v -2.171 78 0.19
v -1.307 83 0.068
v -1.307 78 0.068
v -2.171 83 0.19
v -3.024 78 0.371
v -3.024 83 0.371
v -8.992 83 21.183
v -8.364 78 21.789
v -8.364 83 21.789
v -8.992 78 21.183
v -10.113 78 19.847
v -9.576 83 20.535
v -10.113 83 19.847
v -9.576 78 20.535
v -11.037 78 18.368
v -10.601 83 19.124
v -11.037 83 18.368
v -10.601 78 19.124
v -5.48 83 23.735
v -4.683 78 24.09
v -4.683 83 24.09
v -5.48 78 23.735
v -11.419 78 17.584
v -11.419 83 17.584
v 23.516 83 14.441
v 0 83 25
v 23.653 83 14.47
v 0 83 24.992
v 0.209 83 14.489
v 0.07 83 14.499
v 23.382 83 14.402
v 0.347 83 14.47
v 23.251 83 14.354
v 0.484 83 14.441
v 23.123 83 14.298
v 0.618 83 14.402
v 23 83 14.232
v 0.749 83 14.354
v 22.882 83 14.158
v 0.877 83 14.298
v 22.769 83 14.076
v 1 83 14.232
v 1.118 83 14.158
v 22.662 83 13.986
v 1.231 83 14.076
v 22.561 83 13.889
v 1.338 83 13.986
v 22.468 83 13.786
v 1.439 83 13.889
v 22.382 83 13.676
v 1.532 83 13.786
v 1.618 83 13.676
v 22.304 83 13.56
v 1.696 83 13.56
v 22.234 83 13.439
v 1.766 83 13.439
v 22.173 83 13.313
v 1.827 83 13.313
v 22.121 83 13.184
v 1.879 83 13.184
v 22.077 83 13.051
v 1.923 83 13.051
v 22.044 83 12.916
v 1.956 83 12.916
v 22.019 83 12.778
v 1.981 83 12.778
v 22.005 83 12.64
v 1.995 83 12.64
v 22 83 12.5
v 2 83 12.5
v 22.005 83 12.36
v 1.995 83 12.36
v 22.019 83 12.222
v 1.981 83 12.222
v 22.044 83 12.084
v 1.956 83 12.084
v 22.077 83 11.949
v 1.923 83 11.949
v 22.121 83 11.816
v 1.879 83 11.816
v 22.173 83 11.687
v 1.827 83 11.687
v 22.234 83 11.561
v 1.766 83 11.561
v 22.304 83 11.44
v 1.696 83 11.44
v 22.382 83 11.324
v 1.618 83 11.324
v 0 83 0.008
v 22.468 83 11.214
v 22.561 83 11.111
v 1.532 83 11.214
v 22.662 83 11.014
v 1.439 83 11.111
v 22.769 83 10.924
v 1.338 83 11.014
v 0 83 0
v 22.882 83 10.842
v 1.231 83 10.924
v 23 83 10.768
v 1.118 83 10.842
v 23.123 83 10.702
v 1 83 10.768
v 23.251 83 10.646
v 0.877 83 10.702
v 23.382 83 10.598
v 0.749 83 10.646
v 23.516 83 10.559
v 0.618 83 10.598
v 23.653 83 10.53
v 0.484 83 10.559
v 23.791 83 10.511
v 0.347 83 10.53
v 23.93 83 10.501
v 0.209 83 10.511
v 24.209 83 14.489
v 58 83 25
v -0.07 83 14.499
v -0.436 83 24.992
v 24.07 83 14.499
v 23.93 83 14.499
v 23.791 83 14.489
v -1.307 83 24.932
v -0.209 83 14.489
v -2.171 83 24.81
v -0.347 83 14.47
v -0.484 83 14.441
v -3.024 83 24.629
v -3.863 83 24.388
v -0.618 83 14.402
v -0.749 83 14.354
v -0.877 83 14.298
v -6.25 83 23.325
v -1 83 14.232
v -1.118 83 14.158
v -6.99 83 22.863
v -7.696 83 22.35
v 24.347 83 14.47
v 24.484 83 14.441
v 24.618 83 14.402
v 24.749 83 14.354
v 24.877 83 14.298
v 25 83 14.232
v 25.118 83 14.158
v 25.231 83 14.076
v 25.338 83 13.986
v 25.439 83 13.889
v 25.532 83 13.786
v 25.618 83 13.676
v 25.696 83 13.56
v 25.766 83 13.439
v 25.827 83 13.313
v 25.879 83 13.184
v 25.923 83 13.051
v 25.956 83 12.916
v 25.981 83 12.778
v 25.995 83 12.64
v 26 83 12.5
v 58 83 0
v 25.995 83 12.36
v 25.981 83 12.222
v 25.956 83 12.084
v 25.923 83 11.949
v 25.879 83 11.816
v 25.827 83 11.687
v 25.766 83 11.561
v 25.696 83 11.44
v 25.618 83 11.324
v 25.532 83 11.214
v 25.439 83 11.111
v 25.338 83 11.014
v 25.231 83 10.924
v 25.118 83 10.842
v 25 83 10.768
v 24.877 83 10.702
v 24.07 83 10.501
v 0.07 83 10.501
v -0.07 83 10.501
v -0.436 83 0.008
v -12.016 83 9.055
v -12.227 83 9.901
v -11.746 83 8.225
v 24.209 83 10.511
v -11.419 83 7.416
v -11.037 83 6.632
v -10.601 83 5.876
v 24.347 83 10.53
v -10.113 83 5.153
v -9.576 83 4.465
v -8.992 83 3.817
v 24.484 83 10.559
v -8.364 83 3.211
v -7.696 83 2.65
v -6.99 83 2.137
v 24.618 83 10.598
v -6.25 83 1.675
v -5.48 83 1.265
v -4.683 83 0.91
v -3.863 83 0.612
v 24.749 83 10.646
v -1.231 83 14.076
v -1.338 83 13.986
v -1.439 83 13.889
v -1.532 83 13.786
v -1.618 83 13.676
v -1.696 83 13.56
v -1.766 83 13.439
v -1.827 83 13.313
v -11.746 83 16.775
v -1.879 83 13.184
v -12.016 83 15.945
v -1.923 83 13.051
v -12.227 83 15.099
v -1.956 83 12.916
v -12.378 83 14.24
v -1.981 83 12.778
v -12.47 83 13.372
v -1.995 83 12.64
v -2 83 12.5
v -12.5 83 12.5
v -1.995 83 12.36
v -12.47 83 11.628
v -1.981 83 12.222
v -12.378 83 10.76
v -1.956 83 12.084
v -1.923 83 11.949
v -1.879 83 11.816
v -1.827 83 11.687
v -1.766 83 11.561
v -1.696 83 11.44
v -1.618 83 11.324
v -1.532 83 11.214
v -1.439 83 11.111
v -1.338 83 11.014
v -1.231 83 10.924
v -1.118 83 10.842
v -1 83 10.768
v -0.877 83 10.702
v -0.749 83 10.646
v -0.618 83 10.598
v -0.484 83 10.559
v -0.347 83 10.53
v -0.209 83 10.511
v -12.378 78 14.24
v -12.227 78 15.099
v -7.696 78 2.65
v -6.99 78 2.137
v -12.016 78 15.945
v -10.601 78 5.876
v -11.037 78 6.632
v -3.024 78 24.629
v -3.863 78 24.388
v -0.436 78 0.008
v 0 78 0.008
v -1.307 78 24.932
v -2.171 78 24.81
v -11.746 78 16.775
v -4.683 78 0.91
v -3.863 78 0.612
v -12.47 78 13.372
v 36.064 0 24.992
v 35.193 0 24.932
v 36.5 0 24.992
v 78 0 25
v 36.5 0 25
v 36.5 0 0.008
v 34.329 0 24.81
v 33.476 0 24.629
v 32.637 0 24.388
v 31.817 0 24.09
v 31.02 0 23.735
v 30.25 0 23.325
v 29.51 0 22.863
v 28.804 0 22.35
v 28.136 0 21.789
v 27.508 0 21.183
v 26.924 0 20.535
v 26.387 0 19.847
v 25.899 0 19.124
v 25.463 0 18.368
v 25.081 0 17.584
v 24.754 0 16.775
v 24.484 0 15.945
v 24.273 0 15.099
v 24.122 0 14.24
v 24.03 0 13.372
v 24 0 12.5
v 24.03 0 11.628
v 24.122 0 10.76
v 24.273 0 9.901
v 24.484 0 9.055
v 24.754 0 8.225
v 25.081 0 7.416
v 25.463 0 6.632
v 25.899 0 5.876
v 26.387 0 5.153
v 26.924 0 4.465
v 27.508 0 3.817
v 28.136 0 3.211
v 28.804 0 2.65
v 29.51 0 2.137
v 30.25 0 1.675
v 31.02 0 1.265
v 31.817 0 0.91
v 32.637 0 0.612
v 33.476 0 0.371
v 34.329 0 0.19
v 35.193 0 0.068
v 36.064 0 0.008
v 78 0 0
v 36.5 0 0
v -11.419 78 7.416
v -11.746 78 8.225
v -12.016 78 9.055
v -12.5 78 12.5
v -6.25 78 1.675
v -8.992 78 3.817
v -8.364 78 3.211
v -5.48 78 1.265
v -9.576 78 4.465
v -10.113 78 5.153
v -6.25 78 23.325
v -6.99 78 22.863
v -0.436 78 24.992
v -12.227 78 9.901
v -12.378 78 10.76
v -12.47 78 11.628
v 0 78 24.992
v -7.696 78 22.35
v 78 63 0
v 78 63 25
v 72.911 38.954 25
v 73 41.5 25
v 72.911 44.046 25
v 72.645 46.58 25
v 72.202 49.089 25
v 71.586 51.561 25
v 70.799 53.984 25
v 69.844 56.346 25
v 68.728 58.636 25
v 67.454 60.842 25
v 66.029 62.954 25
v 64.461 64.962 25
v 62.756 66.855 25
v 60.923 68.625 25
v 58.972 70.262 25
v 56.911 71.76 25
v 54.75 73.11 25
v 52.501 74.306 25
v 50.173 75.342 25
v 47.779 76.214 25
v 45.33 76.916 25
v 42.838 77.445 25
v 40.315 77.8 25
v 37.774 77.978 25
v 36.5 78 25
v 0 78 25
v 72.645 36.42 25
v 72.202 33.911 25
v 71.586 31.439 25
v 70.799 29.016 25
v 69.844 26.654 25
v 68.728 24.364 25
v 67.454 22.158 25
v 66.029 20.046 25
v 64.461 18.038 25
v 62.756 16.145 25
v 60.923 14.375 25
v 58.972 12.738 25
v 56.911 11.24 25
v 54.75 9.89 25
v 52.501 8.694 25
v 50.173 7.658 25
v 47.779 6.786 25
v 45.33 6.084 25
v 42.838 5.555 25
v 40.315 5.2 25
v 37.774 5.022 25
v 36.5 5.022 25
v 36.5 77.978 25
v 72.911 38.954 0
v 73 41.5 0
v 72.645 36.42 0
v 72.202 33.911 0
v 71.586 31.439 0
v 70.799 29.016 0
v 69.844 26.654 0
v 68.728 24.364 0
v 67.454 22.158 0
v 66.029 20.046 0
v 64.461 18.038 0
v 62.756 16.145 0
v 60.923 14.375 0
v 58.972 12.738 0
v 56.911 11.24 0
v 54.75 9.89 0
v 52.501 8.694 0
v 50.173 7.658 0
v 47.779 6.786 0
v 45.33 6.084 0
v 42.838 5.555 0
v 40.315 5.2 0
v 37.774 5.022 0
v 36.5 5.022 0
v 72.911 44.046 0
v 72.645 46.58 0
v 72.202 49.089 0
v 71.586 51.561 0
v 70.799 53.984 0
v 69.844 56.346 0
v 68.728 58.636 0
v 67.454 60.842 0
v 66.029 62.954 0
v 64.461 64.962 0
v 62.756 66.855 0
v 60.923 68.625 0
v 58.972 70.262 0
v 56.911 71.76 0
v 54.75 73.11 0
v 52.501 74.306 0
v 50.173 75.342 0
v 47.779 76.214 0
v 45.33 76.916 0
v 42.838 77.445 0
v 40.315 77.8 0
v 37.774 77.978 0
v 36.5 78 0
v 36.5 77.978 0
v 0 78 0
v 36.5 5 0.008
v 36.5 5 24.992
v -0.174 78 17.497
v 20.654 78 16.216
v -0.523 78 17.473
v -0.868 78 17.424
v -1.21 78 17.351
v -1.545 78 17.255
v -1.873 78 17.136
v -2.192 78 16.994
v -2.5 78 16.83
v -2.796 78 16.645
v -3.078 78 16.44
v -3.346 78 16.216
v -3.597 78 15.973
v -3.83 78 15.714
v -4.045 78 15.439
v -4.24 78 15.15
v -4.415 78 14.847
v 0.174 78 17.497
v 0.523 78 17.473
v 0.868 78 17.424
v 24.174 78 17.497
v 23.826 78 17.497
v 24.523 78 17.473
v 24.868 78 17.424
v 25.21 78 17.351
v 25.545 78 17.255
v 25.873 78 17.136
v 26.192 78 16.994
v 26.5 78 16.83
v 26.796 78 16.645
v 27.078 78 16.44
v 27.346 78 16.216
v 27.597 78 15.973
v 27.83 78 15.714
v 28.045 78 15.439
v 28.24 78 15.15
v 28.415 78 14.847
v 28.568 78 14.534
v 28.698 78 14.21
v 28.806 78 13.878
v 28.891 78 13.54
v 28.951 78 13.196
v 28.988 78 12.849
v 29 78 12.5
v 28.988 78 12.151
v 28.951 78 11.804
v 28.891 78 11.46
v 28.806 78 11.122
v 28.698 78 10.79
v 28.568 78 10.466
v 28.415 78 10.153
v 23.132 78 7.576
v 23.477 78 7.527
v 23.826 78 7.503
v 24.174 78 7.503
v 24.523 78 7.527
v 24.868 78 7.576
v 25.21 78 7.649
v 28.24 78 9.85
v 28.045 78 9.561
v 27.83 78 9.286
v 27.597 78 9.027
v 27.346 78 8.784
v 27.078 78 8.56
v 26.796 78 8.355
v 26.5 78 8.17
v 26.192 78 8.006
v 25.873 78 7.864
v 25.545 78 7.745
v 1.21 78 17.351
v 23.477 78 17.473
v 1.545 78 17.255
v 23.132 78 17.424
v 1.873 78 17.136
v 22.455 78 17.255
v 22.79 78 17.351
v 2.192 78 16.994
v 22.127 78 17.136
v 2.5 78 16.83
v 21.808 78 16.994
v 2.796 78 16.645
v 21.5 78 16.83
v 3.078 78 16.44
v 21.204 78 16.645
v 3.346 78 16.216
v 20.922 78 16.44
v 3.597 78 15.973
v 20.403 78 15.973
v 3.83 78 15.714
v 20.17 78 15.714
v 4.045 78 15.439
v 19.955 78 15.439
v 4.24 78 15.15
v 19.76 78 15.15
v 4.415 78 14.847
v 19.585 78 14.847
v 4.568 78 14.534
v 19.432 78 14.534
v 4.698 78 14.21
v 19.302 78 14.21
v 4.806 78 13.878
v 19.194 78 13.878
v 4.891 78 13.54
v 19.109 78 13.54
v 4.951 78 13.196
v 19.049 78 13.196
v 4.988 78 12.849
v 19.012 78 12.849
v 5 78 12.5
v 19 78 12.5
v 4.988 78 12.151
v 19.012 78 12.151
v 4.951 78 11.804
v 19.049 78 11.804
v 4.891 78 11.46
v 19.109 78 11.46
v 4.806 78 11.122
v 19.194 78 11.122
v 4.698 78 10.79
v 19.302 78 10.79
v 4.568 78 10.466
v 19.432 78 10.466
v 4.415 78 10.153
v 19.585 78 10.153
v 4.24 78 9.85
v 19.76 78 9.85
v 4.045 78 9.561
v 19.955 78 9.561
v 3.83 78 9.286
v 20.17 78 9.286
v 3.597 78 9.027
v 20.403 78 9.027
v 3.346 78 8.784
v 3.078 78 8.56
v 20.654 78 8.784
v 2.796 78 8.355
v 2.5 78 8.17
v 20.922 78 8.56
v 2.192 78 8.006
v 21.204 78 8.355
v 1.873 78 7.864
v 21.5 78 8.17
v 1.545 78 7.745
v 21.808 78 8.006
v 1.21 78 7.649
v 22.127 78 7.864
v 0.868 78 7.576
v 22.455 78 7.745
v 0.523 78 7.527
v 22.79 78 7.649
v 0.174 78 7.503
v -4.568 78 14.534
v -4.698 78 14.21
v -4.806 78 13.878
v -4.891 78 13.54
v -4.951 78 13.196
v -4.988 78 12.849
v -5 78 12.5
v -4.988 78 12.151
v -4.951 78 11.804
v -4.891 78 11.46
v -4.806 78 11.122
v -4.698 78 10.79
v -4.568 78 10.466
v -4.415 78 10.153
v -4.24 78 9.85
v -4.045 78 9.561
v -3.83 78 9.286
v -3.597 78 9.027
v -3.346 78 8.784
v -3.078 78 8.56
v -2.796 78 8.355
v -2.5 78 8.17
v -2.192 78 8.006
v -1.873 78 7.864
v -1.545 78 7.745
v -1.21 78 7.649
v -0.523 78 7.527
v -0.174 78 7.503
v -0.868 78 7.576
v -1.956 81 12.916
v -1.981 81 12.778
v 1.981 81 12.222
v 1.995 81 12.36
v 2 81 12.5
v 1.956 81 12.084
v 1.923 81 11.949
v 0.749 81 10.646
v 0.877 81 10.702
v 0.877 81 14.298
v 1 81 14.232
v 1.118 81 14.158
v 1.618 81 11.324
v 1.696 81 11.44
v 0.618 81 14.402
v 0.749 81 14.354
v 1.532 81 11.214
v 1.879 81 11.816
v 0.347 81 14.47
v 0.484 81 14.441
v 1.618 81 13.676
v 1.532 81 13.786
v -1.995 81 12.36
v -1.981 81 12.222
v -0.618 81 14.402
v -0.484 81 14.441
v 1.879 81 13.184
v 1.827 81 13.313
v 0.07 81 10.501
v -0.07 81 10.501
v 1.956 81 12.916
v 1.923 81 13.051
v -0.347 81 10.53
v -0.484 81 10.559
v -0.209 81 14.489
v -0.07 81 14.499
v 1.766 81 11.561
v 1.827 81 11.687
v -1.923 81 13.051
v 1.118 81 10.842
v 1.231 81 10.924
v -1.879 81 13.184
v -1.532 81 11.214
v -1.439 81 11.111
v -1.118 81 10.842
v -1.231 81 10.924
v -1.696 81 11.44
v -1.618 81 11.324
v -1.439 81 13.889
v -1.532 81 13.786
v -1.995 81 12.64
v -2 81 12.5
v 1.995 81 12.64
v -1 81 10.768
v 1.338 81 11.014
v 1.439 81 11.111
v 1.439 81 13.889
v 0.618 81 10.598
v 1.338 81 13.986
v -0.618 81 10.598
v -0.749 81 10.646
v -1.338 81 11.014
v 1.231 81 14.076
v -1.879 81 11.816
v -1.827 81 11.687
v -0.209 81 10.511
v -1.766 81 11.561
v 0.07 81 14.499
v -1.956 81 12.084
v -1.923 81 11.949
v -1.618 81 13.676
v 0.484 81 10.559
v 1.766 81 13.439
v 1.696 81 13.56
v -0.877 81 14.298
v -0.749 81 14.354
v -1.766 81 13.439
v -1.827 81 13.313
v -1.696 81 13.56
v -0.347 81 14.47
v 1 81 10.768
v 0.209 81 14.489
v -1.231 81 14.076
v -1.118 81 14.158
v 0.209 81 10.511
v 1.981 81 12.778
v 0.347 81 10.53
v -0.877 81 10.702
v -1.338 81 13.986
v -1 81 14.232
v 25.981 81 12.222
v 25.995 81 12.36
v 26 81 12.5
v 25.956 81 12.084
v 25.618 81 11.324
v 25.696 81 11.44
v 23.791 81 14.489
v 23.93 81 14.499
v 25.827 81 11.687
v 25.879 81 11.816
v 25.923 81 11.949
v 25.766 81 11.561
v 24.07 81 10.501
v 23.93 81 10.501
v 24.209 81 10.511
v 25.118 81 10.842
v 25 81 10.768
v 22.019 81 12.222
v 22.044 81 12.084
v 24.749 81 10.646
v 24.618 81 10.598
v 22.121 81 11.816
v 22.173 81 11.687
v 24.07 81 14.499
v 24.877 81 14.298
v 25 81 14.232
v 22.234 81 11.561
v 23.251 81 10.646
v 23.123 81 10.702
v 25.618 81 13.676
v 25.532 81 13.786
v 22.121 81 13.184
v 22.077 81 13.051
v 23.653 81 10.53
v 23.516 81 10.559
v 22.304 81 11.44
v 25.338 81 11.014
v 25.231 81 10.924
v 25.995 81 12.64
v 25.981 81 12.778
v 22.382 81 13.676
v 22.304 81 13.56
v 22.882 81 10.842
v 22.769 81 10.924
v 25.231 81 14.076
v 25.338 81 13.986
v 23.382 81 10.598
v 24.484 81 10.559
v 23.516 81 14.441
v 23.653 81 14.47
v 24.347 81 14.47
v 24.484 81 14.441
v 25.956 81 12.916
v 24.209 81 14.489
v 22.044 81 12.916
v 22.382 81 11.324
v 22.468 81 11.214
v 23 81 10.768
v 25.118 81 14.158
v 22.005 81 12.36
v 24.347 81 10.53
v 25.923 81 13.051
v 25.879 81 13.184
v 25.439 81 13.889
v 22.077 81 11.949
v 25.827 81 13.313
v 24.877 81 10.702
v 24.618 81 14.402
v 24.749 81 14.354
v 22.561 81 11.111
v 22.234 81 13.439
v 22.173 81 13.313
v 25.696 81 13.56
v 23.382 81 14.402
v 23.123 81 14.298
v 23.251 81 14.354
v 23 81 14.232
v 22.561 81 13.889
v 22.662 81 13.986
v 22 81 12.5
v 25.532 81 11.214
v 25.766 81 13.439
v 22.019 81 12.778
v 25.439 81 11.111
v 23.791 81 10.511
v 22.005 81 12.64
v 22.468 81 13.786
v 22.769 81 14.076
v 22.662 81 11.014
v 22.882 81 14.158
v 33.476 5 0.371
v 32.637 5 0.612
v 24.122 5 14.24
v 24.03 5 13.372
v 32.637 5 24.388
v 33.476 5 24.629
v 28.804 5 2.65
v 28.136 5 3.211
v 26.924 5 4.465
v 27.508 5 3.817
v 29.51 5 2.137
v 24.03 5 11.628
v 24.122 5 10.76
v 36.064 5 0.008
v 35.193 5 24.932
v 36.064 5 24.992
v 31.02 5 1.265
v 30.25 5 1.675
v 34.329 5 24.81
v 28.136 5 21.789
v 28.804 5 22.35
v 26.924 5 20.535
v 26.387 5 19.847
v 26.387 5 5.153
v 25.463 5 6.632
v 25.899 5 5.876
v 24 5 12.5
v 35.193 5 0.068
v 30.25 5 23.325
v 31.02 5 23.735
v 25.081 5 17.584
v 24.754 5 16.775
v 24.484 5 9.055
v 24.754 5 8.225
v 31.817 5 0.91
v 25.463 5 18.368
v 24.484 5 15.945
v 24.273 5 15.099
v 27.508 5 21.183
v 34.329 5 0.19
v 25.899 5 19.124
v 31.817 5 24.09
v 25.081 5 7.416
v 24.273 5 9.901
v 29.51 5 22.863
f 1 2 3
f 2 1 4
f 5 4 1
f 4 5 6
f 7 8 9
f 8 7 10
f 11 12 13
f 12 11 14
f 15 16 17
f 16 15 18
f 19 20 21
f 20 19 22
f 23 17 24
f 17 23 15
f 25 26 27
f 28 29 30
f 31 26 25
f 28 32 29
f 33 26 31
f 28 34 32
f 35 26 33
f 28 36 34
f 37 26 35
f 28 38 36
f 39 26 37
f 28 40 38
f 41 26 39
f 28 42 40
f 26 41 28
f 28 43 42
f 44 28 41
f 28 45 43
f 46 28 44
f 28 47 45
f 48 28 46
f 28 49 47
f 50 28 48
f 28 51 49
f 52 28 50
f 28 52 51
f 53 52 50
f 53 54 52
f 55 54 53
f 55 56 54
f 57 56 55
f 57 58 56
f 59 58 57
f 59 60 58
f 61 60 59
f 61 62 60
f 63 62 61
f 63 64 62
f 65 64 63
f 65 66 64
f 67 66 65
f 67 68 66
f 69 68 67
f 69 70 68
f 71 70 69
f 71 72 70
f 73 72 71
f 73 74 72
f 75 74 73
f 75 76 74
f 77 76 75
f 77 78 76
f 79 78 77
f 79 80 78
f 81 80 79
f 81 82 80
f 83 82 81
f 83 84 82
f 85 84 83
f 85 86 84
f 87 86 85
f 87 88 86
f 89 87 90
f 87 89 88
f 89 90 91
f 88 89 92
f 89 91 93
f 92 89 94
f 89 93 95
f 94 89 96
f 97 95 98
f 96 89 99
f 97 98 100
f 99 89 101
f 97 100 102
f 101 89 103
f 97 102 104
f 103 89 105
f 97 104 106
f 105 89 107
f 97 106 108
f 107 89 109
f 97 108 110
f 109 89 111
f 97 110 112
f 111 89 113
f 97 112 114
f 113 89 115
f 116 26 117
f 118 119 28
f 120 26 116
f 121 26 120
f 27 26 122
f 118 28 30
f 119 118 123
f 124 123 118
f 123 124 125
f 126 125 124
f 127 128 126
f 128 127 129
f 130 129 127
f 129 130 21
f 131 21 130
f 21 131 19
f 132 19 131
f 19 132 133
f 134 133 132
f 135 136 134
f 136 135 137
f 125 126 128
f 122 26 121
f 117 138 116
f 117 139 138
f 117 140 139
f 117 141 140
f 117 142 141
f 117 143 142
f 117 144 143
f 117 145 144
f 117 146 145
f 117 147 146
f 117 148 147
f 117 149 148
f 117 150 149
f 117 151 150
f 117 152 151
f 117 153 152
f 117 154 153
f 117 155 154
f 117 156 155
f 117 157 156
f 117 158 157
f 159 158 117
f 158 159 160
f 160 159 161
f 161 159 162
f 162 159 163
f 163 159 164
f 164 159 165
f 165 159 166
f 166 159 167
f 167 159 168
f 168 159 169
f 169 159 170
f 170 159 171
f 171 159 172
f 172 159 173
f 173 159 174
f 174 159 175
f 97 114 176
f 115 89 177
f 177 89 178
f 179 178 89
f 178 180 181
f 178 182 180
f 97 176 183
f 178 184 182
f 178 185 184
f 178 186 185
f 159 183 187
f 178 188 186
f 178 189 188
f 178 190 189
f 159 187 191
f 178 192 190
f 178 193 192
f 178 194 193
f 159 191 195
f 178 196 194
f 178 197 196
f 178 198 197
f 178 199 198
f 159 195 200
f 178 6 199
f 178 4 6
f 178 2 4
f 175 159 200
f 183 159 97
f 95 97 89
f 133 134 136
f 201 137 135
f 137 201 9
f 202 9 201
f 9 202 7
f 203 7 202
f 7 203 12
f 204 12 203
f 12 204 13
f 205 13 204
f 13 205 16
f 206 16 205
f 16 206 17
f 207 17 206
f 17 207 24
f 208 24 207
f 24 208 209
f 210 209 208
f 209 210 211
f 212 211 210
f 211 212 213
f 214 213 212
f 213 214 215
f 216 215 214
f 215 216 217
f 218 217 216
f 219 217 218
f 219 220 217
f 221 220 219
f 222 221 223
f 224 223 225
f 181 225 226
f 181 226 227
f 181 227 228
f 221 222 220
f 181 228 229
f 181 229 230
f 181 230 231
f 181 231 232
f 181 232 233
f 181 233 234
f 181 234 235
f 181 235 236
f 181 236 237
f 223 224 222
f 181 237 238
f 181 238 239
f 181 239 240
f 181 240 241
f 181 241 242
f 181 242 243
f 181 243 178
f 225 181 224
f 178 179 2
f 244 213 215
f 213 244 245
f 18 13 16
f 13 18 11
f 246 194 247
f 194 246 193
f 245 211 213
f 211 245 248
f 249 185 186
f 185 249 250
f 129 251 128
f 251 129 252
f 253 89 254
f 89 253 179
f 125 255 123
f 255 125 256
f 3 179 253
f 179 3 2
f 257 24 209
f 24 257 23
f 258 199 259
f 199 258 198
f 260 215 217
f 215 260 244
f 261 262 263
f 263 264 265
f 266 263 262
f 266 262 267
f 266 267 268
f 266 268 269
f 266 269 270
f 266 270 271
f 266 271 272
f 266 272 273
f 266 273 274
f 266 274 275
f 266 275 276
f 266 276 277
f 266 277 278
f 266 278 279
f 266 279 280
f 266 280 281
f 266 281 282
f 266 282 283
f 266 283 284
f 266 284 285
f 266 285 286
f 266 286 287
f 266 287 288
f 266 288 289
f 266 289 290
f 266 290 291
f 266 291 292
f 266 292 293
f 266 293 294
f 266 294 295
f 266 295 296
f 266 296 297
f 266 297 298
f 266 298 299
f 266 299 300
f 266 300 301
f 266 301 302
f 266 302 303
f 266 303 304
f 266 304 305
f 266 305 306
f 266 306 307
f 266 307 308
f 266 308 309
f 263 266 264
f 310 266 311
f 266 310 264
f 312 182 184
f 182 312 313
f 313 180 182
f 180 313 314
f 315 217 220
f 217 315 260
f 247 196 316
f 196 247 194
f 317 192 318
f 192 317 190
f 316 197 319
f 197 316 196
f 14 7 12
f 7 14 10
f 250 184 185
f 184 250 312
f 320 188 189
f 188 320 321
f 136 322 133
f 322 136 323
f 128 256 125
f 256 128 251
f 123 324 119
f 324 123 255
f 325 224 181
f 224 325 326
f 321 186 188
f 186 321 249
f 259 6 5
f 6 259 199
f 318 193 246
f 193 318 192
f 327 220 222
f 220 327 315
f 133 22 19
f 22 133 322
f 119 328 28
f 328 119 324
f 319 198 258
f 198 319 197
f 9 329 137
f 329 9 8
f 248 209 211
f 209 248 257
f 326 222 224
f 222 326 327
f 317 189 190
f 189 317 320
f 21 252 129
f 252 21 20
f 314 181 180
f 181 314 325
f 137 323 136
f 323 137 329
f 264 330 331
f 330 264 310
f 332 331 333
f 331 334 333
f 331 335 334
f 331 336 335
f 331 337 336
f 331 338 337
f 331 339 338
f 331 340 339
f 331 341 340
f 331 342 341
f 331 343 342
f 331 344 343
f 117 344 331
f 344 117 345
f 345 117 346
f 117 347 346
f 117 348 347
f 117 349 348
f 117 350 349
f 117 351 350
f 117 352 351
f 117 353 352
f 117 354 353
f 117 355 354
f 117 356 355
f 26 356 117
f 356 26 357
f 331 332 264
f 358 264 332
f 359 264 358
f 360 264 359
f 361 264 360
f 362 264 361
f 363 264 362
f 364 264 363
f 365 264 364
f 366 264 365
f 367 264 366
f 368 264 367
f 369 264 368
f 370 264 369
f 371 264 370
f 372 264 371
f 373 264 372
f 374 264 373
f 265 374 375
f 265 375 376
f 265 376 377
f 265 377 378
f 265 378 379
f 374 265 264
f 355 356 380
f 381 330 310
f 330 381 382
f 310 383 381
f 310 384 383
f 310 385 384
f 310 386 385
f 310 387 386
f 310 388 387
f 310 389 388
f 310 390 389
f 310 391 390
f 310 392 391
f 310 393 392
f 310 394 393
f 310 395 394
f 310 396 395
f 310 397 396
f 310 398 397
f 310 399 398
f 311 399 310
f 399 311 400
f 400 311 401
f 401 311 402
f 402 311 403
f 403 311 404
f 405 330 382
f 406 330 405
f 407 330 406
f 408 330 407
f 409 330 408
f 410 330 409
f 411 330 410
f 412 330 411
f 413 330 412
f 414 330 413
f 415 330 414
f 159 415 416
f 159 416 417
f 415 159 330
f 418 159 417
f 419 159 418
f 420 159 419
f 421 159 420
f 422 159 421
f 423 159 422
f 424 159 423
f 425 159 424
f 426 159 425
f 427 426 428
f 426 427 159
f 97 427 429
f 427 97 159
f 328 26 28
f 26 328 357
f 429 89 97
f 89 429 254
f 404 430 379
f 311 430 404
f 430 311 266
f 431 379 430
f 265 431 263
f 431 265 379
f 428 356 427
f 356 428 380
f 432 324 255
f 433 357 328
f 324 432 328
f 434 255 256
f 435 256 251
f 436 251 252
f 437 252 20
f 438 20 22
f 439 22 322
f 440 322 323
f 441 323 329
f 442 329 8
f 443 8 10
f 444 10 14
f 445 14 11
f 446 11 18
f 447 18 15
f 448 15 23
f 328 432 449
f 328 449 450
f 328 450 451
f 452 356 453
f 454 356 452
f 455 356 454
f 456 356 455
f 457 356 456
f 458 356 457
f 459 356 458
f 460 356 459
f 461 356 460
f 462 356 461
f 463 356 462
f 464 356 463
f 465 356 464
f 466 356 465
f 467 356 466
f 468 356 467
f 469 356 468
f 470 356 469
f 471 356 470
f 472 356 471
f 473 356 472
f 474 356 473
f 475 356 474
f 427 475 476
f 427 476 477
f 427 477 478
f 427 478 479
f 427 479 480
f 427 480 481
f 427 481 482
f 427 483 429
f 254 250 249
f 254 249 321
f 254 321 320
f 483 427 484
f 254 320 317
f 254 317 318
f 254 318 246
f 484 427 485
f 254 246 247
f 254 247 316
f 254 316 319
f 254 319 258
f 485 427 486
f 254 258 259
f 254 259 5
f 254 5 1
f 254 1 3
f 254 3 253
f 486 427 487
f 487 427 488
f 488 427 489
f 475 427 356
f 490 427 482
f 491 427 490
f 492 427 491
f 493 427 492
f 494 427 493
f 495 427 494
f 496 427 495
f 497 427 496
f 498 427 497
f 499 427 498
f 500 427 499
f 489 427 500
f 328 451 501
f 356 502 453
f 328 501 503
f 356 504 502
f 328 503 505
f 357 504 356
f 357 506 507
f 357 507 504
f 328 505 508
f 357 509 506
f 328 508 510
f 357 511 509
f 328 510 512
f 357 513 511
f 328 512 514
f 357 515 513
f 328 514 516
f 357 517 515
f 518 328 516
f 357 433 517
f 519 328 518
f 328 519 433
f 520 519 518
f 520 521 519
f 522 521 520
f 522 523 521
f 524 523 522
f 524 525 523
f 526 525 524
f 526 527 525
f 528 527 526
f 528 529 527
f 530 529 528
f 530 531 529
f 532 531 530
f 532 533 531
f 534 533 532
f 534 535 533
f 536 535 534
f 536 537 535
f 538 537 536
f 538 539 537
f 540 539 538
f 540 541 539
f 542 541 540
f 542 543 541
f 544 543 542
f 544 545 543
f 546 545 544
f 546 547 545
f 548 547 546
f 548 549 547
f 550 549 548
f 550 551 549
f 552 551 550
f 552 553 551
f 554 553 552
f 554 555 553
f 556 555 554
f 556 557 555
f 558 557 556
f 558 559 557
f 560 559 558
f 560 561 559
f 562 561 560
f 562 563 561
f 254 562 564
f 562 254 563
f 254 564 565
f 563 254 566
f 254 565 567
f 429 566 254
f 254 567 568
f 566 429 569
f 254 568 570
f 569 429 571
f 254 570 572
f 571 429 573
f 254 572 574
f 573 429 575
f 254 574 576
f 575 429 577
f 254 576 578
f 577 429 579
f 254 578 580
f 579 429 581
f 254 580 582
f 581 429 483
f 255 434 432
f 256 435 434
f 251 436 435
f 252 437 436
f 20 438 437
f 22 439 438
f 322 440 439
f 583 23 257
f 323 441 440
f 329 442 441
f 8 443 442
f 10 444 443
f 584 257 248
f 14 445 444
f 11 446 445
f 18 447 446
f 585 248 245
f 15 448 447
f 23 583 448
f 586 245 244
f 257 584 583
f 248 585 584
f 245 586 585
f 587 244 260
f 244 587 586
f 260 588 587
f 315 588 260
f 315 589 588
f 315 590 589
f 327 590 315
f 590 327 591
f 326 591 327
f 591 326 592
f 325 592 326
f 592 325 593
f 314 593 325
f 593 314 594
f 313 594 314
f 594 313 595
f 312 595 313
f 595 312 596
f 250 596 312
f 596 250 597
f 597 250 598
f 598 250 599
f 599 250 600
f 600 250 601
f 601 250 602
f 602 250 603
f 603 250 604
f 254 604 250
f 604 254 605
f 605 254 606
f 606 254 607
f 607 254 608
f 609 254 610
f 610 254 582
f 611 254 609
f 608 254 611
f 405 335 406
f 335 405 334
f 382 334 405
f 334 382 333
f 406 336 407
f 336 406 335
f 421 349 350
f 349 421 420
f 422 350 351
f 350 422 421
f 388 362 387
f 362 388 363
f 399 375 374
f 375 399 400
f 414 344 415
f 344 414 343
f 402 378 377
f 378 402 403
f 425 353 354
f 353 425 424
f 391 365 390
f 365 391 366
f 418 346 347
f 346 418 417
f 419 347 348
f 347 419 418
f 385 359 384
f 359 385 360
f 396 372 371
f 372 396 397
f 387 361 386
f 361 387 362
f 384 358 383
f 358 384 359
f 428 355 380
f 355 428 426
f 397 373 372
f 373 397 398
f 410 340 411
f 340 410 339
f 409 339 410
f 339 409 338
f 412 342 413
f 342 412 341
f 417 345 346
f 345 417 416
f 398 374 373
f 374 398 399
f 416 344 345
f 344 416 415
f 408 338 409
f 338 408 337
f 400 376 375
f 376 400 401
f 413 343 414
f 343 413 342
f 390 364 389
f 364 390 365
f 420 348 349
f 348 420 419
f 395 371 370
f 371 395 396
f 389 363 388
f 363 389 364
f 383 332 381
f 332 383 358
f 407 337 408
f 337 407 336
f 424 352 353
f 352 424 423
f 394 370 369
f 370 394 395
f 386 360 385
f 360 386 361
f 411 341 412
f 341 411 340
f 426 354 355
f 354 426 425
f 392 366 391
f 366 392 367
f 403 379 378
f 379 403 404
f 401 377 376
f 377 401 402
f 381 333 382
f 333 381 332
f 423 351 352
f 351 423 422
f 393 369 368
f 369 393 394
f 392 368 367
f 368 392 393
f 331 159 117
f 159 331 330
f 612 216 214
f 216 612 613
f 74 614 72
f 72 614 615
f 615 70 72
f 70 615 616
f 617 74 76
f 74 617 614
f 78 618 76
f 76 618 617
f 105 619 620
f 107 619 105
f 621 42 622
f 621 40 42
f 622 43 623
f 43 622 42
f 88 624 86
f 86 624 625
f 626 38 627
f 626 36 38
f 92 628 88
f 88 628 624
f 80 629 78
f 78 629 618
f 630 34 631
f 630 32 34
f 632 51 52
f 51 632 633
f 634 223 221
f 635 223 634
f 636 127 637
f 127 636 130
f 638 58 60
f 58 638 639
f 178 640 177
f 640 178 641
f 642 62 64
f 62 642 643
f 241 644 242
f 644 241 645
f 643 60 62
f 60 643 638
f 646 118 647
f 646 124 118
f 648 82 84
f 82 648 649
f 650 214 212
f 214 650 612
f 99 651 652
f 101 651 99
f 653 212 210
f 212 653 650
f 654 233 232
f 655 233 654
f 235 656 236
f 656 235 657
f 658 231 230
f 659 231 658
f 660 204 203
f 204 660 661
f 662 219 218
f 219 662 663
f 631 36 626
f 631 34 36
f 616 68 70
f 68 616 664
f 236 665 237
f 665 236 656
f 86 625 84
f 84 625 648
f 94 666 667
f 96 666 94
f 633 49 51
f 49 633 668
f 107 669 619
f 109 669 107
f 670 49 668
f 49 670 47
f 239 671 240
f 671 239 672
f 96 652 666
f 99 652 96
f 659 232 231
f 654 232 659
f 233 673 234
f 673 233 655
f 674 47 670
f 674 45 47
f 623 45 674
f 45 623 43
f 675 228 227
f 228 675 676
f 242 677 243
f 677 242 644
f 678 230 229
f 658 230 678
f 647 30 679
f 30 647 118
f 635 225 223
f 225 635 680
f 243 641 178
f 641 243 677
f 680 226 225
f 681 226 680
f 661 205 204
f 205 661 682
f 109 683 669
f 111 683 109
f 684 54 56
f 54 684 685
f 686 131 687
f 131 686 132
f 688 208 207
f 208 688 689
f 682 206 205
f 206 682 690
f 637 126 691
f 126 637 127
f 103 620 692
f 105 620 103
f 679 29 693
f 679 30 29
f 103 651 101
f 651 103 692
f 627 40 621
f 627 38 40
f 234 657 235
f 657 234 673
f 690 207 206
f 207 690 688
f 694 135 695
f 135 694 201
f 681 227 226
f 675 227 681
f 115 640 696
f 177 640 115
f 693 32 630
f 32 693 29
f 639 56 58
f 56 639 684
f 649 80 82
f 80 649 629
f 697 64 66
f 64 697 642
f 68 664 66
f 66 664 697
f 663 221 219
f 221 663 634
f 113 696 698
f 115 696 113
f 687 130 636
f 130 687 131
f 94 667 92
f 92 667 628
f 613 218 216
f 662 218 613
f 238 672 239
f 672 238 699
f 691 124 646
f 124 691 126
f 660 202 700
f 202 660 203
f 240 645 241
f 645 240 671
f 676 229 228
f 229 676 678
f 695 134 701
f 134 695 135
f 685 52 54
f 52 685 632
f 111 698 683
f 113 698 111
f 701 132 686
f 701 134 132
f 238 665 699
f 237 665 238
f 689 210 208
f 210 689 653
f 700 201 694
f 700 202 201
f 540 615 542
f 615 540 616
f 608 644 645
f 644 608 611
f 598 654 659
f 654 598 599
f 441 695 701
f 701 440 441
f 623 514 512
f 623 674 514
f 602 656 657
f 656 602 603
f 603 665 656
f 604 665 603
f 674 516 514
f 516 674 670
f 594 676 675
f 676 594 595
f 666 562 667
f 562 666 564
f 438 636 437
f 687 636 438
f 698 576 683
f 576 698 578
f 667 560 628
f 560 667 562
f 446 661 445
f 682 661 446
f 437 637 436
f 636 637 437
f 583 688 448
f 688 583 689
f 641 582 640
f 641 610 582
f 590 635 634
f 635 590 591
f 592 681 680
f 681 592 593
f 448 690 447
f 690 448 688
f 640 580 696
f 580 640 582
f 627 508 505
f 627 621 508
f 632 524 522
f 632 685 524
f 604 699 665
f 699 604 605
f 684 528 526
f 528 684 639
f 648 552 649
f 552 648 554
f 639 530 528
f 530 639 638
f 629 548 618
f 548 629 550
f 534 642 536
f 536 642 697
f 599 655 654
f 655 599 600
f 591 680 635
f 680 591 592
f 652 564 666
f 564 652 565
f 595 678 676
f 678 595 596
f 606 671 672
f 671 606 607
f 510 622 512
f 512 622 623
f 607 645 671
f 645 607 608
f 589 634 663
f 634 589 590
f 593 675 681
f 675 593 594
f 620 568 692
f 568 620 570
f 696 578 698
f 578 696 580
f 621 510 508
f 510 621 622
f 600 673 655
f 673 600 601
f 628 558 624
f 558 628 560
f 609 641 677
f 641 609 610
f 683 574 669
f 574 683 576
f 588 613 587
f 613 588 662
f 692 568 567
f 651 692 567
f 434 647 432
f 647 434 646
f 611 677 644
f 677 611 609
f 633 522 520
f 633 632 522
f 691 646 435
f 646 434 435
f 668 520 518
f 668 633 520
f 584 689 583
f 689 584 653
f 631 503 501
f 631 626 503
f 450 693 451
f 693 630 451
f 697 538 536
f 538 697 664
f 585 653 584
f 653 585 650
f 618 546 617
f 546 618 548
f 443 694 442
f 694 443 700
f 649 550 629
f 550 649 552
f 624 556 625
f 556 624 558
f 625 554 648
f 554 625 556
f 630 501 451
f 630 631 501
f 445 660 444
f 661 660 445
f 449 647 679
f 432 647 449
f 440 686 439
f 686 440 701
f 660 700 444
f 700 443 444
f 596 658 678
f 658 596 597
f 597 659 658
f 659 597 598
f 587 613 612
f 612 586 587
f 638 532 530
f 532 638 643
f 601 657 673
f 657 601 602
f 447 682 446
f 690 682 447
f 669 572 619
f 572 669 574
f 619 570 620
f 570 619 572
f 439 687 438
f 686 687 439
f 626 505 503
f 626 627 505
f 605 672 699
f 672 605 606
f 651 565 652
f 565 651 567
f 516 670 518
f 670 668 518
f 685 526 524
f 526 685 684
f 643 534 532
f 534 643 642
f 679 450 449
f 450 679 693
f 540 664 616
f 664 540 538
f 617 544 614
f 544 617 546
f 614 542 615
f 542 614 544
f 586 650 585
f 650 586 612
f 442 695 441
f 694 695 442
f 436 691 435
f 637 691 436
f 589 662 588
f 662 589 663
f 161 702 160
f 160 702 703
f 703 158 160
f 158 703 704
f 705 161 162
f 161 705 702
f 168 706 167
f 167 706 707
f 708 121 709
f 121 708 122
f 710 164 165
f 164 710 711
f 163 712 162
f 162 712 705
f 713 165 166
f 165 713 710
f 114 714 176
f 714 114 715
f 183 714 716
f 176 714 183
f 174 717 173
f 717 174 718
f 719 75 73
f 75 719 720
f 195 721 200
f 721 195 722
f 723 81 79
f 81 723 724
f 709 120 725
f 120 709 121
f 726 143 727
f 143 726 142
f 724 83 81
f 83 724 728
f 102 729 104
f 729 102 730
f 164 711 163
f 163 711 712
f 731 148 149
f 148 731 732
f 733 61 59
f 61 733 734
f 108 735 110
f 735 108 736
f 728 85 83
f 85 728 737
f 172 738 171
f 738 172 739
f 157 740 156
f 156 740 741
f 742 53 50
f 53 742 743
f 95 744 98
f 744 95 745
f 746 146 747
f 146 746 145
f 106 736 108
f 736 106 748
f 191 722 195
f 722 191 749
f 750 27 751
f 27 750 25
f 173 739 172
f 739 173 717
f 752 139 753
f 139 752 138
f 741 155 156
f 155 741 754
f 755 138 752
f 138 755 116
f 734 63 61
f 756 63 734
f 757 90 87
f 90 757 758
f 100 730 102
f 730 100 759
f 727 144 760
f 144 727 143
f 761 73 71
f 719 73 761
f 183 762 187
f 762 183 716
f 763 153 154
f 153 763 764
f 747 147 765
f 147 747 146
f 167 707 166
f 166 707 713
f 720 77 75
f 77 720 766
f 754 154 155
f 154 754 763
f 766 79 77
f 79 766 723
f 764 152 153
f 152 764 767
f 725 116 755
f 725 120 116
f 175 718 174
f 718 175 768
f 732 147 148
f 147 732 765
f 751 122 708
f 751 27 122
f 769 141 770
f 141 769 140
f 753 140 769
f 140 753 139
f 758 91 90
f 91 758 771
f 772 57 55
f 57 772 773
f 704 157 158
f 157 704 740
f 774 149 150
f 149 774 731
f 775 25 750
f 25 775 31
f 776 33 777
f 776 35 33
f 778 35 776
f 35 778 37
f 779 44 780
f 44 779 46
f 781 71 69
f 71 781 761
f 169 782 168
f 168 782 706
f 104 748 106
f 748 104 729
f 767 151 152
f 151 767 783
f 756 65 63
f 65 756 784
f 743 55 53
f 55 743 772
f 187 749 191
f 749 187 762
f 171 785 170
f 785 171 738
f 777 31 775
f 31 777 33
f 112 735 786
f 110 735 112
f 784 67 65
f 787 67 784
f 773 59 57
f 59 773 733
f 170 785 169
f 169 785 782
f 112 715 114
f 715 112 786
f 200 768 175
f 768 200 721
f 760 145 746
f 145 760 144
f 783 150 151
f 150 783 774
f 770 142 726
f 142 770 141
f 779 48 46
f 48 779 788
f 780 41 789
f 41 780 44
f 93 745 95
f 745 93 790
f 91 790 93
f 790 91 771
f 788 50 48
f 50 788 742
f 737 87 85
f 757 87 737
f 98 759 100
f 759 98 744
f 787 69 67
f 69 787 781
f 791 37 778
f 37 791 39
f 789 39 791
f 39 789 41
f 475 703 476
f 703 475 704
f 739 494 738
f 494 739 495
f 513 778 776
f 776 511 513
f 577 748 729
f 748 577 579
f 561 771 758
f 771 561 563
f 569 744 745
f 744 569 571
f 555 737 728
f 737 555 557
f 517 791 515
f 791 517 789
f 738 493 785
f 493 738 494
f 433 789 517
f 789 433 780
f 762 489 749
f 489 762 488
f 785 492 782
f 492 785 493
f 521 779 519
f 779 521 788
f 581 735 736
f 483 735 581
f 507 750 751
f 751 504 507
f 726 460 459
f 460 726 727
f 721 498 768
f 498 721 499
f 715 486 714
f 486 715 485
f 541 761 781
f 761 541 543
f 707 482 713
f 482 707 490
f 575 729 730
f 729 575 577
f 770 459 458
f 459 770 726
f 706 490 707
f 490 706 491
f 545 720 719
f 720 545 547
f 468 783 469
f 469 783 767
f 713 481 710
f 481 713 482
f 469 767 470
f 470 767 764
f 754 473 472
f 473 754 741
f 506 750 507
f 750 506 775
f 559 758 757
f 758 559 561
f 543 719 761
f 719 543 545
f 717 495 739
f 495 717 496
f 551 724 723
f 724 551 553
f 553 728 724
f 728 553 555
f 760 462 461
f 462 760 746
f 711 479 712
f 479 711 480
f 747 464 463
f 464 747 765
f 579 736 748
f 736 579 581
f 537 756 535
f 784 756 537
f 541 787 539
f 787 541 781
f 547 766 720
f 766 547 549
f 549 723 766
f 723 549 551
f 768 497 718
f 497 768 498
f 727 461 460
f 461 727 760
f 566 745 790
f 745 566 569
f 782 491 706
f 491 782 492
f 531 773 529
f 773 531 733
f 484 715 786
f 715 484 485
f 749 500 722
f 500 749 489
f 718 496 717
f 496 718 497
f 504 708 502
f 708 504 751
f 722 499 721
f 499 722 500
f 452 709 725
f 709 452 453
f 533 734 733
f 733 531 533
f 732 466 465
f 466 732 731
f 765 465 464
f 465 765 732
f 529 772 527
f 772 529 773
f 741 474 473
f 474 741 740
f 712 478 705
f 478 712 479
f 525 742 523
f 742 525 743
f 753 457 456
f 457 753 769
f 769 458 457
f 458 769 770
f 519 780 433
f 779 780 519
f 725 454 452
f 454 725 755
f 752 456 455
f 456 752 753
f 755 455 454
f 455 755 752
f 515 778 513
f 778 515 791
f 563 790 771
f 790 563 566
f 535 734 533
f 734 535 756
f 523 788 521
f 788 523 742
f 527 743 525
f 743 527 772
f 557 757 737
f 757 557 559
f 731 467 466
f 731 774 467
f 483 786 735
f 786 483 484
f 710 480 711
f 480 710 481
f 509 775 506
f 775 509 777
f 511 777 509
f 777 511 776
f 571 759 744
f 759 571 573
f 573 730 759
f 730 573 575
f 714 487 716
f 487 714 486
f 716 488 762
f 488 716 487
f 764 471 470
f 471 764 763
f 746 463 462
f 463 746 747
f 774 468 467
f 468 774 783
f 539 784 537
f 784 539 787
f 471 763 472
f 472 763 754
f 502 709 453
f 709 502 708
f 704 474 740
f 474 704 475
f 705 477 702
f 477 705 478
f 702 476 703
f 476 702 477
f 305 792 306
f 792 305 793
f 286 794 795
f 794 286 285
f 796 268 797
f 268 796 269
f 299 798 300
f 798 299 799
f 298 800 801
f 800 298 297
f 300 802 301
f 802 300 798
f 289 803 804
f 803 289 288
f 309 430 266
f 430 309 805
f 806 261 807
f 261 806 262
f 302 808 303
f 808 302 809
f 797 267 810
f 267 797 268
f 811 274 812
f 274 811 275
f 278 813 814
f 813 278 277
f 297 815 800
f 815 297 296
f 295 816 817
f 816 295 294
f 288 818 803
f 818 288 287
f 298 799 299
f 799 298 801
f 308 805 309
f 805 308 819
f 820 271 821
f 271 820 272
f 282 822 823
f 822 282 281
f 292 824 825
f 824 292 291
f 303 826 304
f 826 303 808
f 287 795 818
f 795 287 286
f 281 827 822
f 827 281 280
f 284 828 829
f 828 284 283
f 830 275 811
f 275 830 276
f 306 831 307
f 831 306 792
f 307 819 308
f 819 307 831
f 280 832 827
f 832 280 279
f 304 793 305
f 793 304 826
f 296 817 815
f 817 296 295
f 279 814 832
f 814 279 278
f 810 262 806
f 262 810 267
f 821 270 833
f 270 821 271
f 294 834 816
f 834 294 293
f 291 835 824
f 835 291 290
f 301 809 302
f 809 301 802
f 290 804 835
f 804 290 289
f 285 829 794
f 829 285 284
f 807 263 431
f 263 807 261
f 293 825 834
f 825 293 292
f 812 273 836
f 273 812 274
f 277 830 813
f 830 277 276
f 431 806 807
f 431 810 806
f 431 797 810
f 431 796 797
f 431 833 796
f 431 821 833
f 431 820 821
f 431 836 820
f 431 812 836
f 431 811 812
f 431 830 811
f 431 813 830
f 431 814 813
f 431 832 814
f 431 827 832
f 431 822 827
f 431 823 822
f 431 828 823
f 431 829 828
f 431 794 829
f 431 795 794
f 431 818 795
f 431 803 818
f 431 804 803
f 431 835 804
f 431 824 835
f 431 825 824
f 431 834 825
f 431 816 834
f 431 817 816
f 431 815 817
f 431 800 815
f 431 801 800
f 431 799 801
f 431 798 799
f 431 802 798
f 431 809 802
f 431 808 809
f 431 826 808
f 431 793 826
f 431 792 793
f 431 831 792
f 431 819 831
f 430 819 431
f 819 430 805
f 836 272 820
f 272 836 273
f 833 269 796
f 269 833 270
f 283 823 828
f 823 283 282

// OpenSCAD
// version 1.01

// adjust this for the diameter of the table pole
POLEDIA=73;



// you probably dont need to adjust any value below here
WIDTH=25;
THICK=5;

DEPTH=POLEDIA+(THICK*2);
HEIGHT=POLEDIA+THICK;

CLIP=30;

SCREWHOLE=4;
COUNTERSINK=10;


difference()
{
    union()
    {
        translate([0,0,WIDTH/2])
        rotate([-90,0,0])
        cylinder(d=WIDTH,h=DEPTH,$fn=90);
        cube([HEIGHT,DEPTH,WIDTH]);
    }
	
	
    translate([-WIDTH/2,-1,0-1])
    cube([WIDTH/2+POLEDIA/2,POLEDIA+THICK+1,WIDTH+2]);
    
    translate([POLEDIA/2,POLEDIA/2+THICK,-1])
    cylinder(d=POLEDIA,h=WIDTH+2,$fn=90);

	// champher for the shoe molding 
	// under the couch
	translate([HEIGHT,DEPTH-CLIP/1.5,-1])
	rotate([0,0,45])
	color("red")    
	cube([CLIP,CLIP,WIDTH+2]);

	
	
	// upper screw hold
	translate([0,0,WIDTH/2])
	rotate([-90,0,0])
	cylinder(h=DEPTH+1,d=SCREWHOLE,$fn=90);

	// upper chamfer
	translate([0,POLEDIA+THICK,WIDTH/2])
	rotate([-90,0,0])
	cylinder(h=THICK,d2=0,d1=COUNTERSINK,$fn=90);

	// lower scew hold
	translate([POLEDIA/2-WIDTH/2,0,WIDTH/2])
	rotate([-90,0,0])
	cylinder(h=DEPTH+1,d=SCREWHOLE,$fn=90);

	// lower chamfer
	translate([POLEDIA/2-WIDTH/2,POLEDIA+THICK,WIDTH/2])
	rotate([-90,0,0])
	cylinder(h=THICK,d2=0,d1=COUNTERSINK,$fn=90);
}
    


//round the end the bracket
translate([POLEDIA/2,0,WIDTH/2])
color("green")
rotate([-90,0,0])
cylinder(d=WIDTH,h=THICK,$fn=90);
